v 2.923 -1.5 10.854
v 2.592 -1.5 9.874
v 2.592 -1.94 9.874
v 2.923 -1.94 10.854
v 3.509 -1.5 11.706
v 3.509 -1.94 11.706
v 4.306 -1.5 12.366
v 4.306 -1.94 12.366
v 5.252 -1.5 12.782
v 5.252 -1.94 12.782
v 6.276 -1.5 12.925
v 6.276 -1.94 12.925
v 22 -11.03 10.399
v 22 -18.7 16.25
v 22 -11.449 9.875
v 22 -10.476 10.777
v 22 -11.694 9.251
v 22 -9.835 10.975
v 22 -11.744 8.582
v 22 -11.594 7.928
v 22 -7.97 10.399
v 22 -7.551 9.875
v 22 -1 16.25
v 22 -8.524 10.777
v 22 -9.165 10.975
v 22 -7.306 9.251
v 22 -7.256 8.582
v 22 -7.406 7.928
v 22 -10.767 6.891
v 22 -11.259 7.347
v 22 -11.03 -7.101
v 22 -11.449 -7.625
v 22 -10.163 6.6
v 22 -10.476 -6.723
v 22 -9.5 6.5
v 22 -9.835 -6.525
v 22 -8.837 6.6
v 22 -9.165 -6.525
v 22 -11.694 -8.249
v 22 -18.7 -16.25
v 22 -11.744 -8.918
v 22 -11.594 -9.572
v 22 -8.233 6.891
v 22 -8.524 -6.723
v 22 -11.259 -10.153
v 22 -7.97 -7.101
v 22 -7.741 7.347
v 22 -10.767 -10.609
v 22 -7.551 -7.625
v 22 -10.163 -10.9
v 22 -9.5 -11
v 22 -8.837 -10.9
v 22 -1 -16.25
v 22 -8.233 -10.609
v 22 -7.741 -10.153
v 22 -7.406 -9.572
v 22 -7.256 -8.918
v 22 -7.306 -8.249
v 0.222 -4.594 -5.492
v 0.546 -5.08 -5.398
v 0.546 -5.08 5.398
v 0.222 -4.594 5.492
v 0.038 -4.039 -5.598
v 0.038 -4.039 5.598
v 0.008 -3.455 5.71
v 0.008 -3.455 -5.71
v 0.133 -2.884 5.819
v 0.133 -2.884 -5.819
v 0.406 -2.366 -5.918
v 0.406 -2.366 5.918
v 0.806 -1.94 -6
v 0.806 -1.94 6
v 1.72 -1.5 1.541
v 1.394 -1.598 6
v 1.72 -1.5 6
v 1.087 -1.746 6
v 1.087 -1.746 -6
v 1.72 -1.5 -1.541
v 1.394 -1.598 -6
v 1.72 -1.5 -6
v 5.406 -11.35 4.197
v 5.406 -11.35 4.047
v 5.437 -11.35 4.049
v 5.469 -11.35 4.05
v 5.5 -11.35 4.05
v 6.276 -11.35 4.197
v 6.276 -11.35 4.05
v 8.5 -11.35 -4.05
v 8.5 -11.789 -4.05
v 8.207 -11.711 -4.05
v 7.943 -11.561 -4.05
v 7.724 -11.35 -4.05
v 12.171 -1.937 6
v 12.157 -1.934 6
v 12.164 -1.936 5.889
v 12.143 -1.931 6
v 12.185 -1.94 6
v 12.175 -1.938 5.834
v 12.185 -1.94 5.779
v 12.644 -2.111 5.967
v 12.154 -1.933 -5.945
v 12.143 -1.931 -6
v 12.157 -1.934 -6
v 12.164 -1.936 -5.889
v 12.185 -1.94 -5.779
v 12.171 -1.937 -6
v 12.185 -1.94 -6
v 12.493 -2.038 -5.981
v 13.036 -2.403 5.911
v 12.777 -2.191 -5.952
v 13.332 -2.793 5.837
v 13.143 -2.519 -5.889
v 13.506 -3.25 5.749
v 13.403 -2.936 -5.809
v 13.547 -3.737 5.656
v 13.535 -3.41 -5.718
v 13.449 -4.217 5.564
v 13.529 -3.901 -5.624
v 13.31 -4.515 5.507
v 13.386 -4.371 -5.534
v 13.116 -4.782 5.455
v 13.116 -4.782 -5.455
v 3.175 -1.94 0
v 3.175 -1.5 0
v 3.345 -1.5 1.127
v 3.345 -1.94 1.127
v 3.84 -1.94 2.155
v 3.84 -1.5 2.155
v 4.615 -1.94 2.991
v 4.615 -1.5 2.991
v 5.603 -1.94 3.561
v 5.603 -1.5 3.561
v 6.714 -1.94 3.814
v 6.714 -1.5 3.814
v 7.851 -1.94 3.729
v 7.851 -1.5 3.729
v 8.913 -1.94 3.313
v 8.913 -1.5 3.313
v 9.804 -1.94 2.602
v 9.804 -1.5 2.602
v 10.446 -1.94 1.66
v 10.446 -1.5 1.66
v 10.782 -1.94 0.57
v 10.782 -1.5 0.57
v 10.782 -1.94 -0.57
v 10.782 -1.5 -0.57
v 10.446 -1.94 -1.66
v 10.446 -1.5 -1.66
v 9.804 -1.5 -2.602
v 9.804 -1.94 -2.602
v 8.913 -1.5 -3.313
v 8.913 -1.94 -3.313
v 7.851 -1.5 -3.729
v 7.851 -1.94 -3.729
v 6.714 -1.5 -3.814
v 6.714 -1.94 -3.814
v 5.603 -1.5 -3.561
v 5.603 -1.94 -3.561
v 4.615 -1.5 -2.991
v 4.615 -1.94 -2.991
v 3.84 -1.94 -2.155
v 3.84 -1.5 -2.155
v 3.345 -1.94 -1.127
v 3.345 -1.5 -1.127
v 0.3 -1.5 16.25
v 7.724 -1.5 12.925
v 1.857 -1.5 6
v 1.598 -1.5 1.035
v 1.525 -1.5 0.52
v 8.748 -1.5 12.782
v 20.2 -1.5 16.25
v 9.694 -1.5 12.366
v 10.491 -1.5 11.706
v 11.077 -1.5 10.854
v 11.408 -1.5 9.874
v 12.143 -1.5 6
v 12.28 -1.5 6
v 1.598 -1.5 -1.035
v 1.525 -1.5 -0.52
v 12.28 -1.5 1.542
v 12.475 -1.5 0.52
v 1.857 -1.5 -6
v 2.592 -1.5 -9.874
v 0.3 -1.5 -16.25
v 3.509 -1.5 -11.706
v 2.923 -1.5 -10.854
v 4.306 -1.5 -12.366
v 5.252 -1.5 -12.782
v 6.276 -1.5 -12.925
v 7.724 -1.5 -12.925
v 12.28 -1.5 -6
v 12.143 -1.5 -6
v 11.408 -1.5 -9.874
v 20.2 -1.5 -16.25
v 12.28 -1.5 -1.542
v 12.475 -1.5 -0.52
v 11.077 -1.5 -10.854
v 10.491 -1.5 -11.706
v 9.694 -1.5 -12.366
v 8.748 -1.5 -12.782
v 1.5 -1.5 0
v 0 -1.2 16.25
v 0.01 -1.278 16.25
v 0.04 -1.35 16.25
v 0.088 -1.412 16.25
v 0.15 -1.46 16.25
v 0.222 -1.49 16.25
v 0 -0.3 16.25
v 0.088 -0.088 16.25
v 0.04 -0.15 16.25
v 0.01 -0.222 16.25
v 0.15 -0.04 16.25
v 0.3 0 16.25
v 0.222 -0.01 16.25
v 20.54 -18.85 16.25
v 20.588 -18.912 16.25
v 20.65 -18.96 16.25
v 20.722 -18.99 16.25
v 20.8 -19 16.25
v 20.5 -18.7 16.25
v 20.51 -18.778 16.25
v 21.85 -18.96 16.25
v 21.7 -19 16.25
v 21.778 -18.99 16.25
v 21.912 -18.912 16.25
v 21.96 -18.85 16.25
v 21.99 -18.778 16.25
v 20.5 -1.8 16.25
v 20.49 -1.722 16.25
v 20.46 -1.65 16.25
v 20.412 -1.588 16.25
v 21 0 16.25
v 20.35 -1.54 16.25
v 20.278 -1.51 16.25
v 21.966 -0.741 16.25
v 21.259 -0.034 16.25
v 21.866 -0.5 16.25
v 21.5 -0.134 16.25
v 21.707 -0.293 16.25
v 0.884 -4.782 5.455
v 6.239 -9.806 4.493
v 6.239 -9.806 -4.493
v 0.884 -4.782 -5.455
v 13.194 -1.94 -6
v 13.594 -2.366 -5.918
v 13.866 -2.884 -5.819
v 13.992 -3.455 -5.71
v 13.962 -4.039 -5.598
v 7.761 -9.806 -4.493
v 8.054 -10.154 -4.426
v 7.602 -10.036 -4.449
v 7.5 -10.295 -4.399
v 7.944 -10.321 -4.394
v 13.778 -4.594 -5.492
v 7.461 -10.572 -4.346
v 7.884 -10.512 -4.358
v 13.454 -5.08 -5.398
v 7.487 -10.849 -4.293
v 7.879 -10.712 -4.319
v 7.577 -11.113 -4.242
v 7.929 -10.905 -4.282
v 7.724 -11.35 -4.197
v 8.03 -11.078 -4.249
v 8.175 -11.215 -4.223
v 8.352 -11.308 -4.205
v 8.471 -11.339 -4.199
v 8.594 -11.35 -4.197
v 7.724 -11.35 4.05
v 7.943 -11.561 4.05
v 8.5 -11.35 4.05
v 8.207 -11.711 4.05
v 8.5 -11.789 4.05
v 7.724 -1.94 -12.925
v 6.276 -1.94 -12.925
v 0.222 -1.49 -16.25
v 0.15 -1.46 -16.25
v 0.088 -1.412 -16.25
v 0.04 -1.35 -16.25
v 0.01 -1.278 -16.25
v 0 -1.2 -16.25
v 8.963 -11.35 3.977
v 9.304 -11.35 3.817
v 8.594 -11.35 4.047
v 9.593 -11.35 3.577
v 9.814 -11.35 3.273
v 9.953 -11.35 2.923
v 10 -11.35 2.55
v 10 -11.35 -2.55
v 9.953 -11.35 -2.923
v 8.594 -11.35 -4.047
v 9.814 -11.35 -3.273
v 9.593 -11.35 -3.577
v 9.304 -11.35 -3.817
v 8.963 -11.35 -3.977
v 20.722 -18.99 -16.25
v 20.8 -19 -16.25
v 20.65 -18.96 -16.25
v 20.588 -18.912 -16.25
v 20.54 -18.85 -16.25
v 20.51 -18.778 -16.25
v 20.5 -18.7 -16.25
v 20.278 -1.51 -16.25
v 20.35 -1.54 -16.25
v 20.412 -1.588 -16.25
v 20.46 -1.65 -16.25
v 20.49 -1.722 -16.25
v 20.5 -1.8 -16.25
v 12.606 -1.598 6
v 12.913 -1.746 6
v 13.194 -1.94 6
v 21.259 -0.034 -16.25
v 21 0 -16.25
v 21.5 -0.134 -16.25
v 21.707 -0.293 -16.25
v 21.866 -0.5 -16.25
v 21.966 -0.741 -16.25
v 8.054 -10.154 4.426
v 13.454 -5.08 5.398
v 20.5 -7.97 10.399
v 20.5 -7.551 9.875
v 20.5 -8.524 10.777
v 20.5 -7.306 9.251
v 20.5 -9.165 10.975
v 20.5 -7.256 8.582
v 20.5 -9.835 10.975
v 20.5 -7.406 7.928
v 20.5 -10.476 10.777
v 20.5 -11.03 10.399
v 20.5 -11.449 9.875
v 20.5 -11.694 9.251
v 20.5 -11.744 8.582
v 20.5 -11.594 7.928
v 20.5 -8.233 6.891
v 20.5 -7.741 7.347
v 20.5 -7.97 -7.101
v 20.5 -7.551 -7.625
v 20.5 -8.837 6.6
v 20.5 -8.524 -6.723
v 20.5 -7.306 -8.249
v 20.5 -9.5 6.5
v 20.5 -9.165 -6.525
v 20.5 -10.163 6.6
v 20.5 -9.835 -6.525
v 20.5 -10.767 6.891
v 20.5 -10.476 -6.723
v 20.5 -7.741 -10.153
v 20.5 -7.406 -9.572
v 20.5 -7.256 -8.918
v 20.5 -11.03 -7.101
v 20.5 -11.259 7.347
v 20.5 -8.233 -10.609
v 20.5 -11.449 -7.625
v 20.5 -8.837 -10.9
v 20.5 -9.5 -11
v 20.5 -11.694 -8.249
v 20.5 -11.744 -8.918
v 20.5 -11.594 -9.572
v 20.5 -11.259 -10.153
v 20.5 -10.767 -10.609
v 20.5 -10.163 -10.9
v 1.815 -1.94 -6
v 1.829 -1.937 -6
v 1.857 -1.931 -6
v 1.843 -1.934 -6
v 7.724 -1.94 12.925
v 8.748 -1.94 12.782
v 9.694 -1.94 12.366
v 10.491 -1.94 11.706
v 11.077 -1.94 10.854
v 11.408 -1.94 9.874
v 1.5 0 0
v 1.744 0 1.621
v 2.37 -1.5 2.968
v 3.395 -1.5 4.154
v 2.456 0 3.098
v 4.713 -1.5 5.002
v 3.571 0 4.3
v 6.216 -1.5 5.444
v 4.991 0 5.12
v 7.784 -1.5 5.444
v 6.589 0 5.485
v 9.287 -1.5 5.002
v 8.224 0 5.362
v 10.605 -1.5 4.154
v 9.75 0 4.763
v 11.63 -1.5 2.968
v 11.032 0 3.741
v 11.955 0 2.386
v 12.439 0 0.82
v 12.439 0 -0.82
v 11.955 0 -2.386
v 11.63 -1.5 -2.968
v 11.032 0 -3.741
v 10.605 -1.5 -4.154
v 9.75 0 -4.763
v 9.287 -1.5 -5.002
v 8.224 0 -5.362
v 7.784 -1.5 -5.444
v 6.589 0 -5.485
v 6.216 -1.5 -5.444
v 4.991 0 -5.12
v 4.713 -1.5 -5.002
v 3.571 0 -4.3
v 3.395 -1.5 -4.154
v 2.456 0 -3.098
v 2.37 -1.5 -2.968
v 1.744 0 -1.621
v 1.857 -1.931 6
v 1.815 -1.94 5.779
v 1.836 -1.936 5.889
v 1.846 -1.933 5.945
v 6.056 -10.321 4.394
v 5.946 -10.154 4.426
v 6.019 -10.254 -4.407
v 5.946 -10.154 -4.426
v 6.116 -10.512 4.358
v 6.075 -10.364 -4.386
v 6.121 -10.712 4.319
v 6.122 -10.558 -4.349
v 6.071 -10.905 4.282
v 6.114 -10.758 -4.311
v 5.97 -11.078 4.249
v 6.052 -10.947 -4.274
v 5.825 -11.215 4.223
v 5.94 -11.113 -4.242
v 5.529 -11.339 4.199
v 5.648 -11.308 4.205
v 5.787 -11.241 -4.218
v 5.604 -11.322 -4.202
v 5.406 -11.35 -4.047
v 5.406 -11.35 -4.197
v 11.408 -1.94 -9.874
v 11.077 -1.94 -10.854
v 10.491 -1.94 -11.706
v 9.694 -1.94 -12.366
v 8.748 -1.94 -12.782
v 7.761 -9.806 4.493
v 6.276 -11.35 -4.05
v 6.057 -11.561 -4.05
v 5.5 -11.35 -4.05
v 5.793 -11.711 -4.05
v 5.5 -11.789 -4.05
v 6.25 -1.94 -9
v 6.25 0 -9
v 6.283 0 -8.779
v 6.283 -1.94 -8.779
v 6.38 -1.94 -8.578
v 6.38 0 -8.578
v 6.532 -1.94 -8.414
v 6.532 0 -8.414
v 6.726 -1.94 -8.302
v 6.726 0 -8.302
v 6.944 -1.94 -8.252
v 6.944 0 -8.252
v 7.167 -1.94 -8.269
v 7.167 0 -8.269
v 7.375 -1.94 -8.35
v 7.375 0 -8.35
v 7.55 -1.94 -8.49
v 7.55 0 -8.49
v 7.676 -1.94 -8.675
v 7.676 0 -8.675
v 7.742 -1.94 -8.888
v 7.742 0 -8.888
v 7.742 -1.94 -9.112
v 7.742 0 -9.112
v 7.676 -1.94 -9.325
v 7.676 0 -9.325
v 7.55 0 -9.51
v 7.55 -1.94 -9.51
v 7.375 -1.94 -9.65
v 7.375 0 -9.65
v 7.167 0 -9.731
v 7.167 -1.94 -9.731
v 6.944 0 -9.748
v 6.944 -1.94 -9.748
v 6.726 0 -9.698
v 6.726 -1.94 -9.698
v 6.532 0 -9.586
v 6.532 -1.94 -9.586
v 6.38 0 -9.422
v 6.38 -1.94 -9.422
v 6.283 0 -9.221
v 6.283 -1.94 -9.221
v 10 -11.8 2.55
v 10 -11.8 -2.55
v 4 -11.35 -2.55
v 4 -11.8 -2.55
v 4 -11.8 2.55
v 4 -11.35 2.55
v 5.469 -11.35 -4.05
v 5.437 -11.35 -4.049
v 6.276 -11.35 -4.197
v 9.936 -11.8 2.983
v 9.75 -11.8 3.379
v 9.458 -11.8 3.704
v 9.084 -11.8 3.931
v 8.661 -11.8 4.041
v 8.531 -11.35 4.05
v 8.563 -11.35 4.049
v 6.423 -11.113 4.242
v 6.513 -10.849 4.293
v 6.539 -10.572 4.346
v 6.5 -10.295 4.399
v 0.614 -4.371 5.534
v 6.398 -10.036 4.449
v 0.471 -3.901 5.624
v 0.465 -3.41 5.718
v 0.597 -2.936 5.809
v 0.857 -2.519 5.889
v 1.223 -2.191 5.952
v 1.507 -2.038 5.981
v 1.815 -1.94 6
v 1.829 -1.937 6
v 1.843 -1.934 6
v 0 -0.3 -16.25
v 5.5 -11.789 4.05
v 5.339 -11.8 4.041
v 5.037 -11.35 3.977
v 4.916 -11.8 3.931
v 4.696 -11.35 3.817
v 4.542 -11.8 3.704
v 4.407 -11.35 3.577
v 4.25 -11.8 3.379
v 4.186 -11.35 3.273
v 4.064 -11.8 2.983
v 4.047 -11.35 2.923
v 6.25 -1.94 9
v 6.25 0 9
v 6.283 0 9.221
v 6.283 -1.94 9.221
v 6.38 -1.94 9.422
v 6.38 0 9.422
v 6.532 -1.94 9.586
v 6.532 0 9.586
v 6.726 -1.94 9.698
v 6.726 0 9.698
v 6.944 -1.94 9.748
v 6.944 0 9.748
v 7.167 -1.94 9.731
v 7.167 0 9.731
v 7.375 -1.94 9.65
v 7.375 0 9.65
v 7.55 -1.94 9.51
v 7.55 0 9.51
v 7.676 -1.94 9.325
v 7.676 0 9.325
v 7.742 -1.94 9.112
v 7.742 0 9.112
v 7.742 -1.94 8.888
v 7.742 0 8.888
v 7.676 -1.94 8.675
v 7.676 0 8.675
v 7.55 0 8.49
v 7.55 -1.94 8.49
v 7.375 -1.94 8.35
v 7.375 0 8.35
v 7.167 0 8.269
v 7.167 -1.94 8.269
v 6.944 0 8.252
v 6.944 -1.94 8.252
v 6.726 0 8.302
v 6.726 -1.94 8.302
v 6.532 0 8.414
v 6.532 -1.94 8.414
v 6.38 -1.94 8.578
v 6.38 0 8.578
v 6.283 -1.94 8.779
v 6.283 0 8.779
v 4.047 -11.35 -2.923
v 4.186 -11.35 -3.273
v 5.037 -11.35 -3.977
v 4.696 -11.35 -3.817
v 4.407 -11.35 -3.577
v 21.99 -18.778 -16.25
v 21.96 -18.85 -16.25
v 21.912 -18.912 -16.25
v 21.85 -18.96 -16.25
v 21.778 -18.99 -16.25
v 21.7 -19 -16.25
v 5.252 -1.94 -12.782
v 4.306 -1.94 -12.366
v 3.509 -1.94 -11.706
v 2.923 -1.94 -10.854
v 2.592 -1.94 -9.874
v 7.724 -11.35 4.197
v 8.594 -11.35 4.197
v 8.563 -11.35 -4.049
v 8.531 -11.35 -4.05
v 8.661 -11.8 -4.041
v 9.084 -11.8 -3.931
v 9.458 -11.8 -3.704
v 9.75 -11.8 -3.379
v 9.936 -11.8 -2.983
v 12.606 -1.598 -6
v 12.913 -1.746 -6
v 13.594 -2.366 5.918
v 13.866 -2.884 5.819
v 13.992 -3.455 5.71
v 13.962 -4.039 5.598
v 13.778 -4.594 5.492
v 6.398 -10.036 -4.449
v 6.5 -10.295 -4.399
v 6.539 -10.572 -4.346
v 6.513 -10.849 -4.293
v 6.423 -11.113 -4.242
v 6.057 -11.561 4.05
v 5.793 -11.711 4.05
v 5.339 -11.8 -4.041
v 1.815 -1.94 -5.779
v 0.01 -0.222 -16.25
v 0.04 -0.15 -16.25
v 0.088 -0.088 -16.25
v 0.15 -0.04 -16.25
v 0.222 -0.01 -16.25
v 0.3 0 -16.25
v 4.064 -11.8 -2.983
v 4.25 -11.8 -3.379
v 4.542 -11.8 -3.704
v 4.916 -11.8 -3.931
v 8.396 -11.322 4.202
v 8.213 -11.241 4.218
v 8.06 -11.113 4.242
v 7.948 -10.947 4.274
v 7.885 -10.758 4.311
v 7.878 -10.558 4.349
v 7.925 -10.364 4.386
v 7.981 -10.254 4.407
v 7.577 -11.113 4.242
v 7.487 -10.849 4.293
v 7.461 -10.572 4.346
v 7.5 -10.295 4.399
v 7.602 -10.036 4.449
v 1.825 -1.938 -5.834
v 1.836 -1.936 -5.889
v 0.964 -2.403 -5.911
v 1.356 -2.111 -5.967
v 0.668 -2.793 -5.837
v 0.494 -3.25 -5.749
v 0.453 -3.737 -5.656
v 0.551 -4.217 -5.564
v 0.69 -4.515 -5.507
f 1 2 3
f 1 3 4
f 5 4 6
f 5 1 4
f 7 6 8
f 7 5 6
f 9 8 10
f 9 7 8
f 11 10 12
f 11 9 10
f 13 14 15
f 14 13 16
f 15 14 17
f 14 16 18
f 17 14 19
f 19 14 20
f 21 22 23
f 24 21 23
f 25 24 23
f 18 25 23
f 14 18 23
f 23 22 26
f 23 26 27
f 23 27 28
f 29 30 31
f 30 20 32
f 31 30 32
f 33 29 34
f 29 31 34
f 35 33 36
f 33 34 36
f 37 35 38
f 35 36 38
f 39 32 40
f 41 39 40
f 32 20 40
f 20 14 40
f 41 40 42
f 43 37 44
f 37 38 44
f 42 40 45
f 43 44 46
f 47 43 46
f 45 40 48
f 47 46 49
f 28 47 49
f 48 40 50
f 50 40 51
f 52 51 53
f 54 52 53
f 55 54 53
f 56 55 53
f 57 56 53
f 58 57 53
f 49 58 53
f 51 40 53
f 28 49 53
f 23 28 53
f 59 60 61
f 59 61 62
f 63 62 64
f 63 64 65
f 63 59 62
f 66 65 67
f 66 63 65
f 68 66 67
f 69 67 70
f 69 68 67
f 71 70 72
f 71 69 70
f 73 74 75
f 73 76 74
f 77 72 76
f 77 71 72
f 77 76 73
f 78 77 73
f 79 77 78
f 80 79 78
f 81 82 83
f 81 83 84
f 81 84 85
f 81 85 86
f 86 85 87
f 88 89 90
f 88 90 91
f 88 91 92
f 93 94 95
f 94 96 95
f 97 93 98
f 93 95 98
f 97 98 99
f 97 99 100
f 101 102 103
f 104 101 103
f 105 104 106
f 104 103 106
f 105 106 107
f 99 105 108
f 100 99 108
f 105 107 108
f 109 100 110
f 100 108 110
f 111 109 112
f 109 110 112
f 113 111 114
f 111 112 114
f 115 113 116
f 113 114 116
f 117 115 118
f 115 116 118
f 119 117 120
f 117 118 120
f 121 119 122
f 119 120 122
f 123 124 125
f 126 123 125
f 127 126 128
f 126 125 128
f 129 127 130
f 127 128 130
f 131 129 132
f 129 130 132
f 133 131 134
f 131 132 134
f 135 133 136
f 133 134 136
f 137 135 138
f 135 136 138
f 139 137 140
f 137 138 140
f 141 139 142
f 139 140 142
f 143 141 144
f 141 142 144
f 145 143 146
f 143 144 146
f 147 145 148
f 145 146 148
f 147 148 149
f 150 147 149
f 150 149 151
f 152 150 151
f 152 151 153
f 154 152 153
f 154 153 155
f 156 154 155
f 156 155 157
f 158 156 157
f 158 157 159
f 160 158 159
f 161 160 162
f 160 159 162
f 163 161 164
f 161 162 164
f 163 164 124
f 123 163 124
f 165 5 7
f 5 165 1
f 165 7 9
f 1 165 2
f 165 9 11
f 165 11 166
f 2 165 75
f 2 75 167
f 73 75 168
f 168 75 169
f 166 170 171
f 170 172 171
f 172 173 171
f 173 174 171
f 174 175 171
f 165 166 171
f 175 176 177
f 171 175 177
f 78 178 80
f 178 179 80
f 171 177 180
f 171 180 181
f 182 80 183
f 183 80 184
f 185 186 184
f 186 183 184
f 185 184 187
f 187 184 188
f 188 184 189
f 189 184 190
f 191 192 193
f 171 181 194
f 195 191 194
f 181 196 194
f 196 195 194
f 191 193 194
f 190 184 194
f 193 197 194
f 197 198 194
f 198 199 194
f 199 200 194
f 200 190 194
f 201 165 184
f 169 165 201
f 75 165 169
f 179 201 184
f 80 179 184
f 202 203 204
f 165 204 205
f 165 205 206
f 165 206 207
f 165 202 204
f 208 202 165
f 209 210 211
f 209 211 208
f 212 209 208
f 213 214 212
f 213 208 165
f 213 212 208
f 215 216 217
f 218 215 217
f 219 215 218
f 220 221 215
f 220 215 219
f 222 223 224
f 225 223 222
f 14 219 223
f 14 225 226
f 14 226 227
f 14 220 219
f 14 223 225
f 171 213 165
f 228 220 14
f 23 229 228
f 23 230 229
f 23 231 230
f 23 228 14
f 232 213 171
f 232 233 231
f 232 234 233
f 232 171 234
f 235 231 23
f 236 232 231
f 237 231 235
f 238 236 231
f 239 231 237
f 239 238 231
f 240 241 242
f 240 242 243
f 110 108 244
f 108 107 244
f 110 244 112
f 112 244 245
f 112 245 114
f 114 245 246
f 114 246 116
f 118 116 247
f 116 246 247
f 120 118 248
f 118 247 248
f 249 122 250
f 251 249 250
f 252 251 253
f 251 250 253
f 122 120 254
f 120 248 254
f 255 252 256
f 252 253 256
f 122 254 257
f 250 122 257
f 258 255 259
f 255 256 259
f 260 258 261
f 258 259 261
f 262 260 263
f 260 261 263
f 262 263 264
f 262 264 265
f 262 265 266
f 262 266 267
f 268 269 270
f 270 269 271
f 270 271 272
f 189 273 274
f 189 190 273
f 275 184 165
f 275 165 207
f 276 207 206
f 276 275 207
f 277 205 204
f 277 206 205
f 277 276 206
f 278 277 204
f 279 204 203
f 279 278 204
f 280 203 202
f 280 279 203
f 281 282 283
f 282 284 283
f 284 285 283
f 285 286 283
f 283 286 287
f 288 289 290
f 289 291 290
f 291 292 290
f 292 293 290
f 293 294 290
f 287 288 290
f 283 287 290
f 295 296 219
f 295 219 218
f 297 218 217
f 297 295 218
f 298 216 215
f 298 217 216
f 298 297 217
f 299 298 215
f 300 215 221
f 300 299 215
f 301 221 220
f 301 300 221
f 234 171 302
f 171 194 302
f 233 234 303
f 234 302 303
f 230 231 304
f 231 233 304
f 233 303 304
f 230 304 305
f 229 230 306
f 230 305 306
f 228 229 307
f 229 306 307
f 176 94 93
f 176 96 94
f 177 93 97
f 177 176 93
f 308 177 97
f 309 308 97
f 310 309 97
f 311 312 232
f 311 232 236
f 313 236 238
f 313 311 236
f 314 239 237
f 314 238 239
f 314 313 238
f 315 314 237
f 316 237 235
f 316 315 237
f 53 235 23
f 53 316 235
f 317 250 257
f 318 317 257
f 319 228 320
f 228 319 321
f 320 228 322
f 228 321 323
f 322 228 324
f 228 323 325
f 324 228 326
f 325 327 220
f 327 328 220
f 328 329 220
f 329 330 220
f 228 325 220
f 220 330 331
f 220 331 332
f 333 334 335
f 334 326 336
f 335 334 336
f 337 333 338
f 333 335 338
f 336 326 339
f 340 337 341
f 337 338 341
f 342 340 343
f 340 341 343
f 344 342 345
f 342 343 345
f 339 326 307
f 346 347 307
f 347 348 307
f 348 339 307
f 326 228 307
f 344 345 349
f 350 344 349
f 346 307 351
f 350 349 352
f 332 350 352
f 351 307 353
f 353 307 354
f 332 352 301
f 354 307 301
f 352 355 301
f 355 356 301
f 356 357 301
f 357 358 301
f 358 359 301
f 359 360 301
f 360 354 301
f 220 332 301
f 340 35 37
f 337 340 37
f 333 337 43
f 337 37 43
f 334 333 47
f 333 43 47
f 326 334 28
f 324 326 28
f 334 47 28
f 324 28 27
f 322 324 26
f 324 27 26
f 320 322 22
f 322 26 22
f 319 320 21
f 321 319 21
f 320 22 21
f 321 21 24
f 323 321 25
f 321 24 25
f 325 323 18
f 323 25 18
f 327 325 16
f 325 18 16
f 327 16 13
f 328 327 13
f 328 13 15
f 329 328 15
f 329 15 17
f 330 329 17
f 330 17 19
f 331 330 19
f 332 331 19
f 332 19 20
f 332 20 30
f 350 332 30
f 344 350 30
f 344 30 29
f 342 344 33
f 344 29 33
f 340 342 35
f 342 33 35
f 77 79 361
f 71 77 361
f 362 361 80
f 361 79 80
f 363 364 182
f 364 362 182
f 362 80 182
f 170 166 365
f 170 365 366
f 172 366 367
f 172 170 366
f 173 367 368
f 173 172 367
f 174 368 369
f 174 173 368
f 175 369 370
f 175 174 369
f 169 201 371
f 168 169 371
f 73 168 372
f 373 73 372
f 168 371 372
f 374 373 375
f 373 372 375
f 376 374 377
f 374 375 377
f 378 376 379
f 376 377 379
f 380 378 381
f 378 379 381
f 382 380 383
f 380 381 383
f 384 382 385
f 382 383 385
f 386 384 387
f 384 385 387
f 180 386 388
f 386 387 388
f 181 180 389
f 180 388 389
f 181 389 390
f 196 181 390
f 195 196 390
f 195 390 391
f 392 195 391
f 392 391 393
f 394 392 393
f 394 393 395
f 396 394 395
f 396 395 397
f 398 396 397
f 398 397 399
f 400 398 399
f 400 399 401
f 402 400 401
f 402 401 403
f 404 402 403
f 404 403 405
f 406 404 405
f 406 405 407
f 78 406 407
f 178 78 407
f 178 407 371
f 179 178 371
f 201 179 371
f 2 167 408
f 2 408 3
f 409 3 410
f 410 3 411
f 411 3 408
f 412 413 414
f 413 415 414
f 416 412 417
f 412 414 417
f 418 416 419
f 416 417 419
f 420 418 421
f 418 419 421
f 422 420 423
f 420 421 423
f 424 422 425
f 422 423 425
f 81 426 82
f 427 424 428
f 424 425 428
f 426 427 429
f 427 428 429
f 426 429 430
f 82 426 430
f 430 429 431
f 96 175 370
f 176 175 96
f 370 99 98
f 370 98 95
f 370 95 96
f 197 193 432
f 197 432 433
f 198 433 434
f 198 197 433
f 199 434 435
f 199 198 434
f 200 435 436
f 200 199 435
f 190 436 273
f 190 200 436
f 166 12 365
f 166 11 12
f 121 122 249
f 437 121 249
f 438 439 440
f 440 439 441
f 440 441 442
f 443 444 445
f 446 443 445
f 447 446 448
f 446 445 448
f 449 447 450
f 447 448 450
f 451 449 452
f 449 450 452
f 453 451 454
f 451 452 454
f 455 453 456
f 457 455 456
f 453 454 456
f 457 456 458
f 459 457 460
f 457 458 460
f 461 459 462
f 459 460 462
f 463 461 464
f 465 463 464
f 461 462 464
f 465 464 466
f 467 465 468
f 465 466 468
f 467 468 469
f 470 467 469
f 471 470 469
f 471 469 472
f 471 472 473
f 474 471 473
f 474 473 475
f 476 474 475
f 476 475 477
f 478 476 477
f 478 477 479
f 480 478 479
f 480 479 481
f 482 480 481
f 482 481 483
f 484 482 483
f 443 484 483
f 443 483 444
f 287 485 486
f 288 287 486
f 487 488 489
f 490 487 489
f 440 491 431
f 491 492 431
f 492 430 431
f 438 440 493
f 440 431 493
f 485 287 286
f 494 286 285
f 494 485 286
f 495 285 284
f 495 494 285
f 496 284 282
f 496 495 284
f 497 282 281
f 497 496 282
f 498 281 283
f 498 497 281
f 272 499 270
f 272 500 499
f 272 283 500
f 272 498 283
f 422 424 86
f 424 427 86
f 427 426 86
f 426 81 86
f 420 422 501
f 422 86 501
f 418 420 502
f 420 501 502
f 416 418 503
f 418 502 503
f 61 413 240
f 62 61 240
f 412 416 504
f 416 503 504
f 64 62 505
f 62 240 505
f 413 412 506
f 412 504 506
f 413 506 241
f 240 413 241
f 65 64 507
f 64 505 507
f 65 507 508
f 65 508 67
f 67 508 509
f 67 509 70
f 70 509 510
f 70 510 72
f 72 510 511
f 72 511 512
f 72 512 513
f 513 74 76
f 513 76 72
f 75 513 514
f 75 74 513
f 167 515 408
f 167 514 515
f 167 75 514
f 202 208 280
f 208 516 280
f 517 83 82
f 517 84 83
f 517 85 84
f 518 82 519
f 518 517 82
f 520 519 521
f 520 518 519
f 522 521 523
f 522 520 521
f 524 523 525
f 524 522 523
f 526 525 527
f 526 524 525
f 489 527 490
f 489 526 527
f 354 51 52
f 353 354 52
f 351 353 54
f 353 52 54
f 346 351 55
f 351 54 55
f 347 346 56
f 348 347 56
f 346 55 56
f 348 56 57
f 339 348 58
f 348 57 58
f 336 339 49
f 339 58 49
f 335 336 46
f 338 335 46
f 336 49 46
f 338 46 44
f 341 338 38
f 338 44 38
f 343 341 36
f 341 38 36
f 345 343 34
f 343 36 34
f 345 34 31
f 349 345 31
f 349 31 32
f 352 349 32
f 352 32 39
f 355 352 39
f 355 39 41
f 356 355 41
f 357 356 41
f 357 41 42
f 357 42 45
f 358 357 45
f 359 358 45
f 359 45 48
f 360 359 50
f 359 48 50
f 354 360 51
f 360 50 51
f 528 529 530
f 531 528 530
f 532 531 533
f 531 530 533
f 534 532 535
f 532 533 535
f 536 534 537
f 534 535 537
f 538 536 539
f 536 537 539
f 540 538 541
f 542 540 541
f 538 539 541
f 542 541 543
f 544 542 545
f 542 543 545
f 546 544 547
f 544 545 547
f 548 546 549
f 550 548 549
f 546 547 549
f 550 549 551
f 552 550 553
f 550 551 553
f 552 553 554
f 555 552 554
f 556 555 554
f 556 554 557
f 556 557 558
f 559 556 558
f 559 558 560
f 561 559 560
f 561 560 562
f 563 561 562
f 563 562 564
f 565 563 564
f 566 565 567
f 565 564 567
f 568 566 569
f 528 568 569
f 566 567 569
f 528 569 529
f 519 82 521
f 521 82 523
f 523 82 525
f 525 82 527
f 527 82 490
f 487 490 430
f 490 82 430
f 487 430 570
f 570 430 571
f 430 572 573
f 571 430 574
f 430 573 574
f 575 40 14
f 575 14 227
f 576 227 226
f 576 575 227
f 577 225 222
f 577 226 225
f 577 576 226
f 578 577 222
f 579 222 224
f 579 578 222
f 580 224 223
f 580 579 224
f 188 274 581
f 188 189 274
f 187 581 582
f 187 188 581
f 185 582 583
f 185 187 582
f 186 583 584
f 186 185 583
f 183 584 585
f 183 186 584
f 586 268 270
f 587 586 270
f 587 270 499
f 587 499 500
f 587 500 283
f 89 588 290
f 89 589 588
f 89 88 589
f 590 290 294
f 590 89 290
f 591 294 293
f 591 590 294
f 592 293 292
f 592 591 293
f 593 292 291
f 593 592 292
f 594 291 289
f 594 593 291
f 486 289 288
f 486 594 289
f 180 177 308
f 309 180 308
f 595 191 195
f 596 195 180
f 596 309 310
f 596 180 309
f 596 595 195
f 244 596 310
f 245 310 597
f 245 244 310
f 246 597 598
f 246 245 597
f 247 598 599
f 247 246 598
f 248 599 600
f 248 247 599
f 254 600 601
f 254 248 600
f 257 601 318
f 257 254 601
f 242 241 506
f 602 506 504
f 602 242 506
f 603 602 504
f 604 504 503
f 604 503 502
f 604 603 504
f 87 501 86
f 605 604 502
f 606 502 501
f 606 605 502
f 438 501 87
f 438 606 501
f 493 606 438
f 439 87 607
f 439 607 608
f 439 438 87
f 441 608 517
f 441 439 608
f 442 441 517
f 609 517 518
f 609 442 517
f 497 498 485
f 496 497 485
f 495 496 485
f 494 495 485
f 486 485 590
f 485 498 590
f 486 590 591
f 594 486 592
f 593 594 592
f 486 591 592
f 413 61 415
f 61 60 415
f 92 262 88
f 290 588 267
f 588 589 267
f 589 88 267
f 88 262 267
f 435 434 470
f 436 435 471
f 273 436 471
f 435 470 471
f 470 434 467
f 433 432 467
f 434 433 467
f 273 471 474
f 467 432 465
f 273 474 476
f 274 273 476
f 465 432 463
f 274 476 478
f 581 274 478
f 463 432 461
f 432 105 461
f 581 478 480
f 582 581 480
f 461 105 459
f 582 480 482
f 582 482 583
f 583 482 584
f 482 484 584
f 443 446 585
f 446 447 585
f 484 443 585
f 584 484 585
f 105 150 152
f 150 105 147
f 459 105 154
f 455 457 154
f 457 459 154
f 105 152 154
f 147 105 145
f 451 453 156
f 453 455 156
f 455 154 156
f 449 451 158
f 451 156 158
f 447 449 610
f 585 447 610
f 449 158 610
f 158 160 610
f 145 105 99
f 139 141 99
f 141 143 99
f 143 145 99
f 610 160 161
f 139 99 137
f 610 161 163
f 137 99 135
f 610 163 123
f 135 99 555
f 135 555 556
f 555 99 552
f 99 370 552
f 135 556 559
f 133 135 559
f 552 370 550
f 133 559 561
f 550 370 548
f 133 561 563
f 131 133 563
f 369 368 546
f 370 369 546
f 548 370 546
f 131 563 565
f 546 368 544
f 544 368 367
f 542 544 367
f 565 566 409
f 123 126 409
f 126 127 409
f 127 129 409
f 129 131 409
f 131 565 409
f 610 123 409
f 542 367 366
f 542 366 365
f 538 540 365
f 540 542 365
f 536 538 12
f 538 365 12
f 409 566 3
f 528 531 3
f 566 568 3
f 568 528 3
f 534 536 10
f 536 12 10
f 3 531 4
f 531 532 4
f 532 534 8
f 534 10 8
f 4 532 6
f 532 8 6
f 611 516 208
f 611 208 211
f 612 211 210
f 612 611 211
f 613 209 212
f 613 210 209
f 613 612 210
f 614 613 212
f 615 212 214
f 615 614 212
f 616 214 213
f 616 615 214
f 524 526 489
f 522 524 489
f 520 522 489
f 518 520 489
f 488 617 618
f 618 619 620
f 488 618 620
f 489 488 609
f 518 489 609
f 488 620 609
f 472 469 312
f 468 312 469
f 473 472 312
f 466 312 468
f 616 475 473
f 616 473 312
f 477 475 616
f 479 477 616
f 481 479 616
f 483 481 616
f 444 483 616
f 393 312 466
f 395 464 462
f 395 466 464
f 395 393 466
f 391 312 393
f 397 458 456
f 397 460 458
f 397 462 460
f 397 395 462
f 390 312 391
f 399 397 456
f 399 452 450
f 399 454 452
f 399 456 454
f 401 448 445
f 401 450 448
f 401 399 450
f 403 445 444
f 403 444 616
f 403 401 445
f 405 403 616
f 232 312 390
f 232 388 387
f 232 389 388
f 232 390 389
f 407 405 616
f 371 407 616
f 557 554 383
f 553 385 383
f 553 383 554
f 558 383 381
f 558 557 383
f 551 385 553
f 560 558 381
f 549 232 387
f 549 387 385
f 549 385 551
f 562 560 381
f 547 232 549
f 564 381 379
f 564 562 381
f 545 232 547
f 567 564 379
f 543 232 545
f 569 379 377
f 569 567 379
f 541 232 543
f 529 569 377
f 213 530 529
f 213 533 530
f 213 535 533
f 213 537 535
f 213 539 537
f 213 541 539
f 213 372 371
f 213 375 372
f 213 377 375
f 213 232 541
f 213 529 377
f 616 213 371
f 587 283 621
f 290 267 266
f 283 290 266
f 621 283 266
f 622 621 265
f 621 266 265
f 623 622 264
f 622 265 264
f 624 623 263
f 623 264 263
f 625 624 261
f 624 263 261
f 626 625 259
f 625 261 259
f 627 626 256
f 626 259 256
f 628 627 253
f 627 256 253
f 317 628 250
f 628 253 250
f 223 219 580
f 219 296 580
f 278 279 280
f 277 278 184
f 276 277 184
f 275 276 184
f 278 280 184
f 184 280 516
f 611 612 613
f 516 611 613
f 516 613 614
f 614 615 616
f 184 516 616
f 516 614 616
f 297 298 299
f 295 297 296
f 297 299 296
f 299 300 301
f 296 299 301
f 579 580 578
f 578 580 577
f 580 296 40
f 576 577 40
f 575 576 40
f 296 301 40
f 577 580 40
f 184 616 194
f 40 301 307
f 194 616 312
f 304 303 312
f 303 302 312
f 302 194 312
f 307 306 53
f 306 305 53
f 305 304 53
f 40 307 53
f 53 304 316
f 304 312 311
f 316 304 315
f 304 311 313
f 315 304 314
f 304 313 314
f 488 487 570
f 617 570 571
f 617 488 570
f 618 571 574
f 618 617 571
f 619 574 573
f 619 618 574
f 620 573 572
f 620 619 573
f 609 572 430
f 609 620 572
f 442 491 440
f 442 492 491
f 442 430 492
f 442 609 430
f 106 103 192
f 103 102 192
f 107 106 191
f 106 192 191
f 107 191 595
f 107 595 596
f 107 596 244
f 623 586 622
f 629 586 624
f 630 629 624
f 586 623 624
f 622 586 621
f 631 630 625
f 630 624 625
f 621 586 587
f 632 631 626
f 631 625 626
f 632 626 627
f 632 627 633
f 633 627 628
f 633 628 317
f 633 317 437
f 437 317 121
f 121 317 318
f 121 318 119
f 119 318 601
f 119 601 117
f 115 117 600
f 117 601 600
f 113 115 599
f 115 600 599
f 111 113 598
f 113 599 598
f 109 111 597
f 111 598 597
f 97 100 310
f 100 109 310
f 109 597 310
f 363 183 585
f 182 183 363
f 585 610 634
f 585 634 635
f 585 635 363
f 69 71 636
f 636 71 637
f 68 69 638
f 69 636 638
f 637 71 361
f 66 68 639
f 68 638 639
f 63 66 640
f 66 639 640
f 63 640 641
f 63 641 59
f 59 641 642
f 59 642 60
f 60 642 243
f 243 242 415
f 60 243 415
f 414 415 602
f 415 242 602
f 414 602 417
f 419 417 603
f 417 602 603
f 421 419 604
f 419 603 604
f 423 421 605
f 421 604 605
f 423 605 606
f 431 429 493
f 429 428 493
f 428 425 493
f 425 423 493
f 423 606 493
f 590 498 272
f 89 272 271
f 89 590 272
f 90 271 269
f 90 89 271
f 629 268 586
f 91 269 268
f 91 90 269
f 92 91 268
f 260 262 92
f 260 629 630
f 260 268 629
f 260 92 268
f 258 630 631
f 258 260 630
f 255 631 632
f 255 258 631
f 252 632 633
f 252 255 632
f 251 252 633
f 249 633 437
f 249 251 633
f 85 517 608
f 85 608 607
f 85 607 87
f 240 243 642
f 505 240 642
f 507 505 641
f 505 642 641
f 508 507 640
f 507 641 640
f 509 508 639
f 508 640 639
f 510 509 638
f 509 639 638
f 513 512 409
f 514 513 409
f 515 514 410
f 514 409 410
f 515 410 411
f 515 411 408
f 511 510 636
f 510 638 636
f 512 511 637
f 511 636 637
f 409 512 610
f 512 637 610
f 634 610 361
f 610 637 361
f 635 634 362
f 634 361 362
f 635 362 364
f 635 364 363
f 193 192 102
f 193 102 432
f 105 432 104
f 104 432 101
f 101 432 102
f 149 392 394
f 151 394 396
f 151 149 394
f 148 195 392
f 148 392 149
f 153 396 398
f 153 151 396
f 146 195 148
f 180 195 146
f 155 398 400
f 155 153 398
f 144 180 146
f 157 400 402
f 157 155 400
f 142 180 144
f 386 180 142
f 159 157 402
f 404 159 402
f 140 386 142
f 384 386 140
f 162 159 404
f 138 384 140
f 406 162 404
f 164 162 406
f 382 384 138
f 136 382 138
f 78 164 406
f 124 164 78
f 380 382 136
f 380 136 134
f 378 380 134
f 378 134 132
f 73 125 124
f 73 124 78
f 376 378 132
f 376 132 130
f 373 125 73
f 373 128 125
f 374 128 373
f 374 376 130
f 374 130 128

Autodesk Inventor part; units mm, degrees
sketch "Skizze_1" plane through (0, 0, 0) normal (0, 0, 1) x (1, 0, 0)
  line L0 (0, -0.3) -> (0, -1.2)
  arc A0 (0, -1.2) -> (0.3, -1.5) centre (0.3, -1.2) ccw
  line L1 (0.3, -1.5) -> (20.2, -1.5)
  arc A1 (20.5, -1.8) -> (20.2, -1.5) centre (20.2, -1.8) ccw
  line L2 (20.5, -1.8) -> (20.5, -18.7)
  arc A2 (20.5, -18.7) -> (20.8, -19) centre (20.8, -18.7) ccw
  line L3 (20.8, -19) -> (21.7, -19)
  arc A3 (21.7, -19) -> (22, -18.7) centre (21.7, -18.7) ccw
  line L4 (22, -18.7) -> (22, -1)
  arc A4 (22, -1) -> (21, 0) centre (21, -1) ccw
  line L5 (21, 0) -> (0.3, 0)
  arc A5 (0.3, 0) -> (0, -0.3) centre (0.3, -0.3) ccw
extrude "Extrusion1" add sketch "Skizze_1" along normal mid plane 32.5
sketch "Skizze_2" plane through (22, 0, 0) normal (1, 0, 0) x (0, 0, -1)
  circle A0 centre (8.75, -9.5) radius 2.25
extrude "Extrusion2" cut sketch "Skizze_2" along normal mid plane 3
sketch "Skizze_3" plane through (22, 0, 0) normal (1, 0, 0) x (0, 0, -1)
  circle A0 centre (-8.75, -9.5) radius 2.25
extrude "Extrusion3" cut sketch "Skizze_3" along normal mid plane 3
sketch "Skizze_4" plane through (0, 0, 0) normal (0, 0, 1) x (1, 0, 0)
  arc A0 (2.1852, -1.45) -> (0.5463, -5.08) centre (2.1852, -3.635) ccw
  line L0 (0.5463, -5.08) -> (5.946, -10.1545)
  arc A1 (5.4062, -11.35) -> (5.946, -10.1545) centre (5.4062, -10.6304) ccw
  line L1 (5.4062, -11.35) -> (4, -11.35)
  line L2 (4, -11.35) -> (4, -11.8)
  line L3 (4, -11.8) -> (5.3389, -11.8)
  arc A2 (5.3389, -11.8) -> (6.239, -9.8064) centre (5.3389, -10.6) ccw
  line L4 (6.239, -9.8064) -> (0.8838, -4.7824)
  arc A3 (2.1852, -1.9) -> (0.8838, -4.7824) centre (2.1852, -3.635) ccw
  line L5 (2.1852, -1.9) -> (11.8148, -1.9)
  arc A4 (13.1162, -4.7824) -> (11.8148, -1.9) centre (11.8148, -3.635) ccw
  line L6 (13.1162, -4.7824) -> (7.761, -9.8064)
  arc A5 (7.761, -9.8064) -> (8.6611, -11.8) centre (8.6611, -10.6) ccw
  line L7 (8.6611, -11.8) -> (10, -11.8)
  line L8 (10, -11.8) -> (10, -11.35)
  line L9 (10, -11.35) -> (8.5938, -11.35)
  arc A6 (8.054, -10.1545) -> (8.5938, -11.35) centre (8.5938, -10.6304) ccw
  line L10 (8.054, -10.1545) -> (13.4537, -5.08)
  arc A7 (13.4537, -5.08) -> (11.8148, -1.45) centre (11.8148, -3.635) ccw
  line L11 (11.8148, -1.45) -> (2.1852, -1.45)
extrude "Extrusion4" add sketch "Skizze_4" along normal mid plane 12
sketch "Skizze_5" plane through (0, 0, 0) normal (0, 1, 0) x (-1, 0, 0)
  line L0 (-1.809, 5.7484) -> (-2.5923, 9.8744)
  arc A0 (-2.5923, 9.8744) -> (-6.2765, 12.925) centre (-6.2765, 9.175) ccw
  line L1 (-6.2765, 12.925) -> (-7.7235, 12.925)
  arc A1 (-7.7235, 12.925) -> (-11.4077, 9.8744) centre (-7.7235, 9.175) ccw
  line L2 (-11.4077, 9.8744) -> (-12.191, 5.7484)
  line L3 (-12.191, 5.7484) -> (-12.191, -5.7484)
  line L4 (-12.191, -5.7484) -> (-11.4077, -9.8744)
  arc A2 (-11.4077, -9.8744) -> (-7.7235, -12.925) centre (-7.7235, -9.175) ccw
  line L5 (-7.7235, -12.925) -> (-6.2765, -12.925)
  arc A3 (-6.2765, -12.925) -> (-2.5923, -9.8744) centre (-6.2765, -9.175) ccw
  line L6 (-2.5923, -9.8744) -> (-1.809, -5.7484)
  line L7 (-1.809, -5.7484) -> (-1.809, 5.7484)
extrude "Extrusion5" add sketch "Skizze_5" against normal blind 1.94
sketch "Skizze_6_ALT_Drilling_1" plane through (0, 0, 0) normal (0, 1, 0) x (-1, 0, 0)
  circle A0 centre (-7, 0) radius 5.5
extrude "Extrusion6" cut sketch "Skizze_6_ALT_Drilling_1" against normal blind 1.5
sketch "Skizze_7_ALT_Drilling_2" plane through (0, 0, 0) normal (0, 1, 0) x (-1, 0, 0)
  circle A0 centre (-7, 0) radius 3.825
extrude "Extrusion7" cut sketch "Skizze_7_ALT_Drilling_2" against normal blind 2.6
sketch "Skizze_8" plane through (17, 0, 0) normal (1, 0, 0) x (0, 0, -1)
  line L0 (-6, -1.94) -> (-6, -12.9)
  line L1 (-6, -12.9) -> (-3.9, -12.9)
  line L2 (-3.9, -12.9) -> (-6, -1.94)
extrude "Extrusion8" cut sketch "Skizze_8" against normal blind 30
sketch "Skizze_9" plane through (17, 0, 0) normal (1, 0, 0) x (0, 0, -1)
  line L0 (3.9, -12.9) -> (6, -12.9)
  line L1 (6, -12.9) -> (6, -1.94)
  line L2 (6, -1.94) -> (3.9, -12.9)
extrude "Extrusion9" cut sketch "Skizze_9" against normal blind 30
sketch "Skizze_10_ALT_Drilling_3" plane through (0, 0, 0) normal (0, 1, 0) x (-1, 0, 0)
  circle A0 centre (-7, 9) radius 0.75
extrude "Extrusion10" cut sketch "Skizze_10_ALT_Drilling_3" against normal blind 3
sketch "Skizze_11_ALT_Drilling_4" plane through (0, 0, 0) normal (0, 1, 0) x (-1, 0, 0)
  circle A0 centre (-7, -9) radius 0.75
extrude "Extrusion11" cut sketch "Skizze_11_ALT_Drilling_4" against normal blind 3
sketch "Skizze_12" plane through (0, -11.8, 0) normal (0, 1, 0) x (1, 0, 0)
  line L0 (3, -5.05) -> (11, -5.05)
  line L1 (11, -5.05) -> (11, 5.05)
  line L2 (11, 5.05) -> (3, 5.05)
  line L3 (3, 5.05) -> (3, -5.05)
  arc A0 (4, -2.55) -> (5.5, -4.05) centre (5.5, -2.55) ccw
  line L4 (5.5, -4.05) -> (8.5, -4.05)
  arc A1 (8.5, -4.05) -> (10, -2.55) centre (8.5, -2.55) ccw
  line L5 (10, -2.55) -> (10, 2.55)
  arc A2 (10, 2.55) -> (8.5, 4.05) centre (8.5, 2.55) ccw
  line L6 (8.5, 4.05) -> (5.5, 4.05)
  arc A3 (5.5, 4.05) -> (4, 2.55) centre (5.5, 2.55) ccw
  line L7 (4, 2.55) -> (4, -2.55)
extrude "Extrusion12" cut sketch "Skizze_12" along normal blind 0.45
ref_plane "side_1_XY" through (22, -9.5, 0) normal (1, 0, 0) x (0, 1, 0)
ref_plane "side_1_YZ" through (22, -9.5, 0) normal (0, 1, 0) x (0, 0, 1)
ref_plane "side_1_ZX" through (22, -9.5, 0) normal (0, 0, 1) x (1, 0, 0)
ref_plane "side_2_XY" through (7, -1.6, 0) normal (0, 1, 0) x (1, 0, 0)
ref_plane "side_2_YZ" through (7, -1.6, 0) normal (1, 0, 0) x (0, 0, -1)
ref_plane "side_2_ZX" through (7, -1.6, 0) normal (0, 0, -1) x (0, 1, 0)
properties part number "May Tec 1.64.5101._Mounting angle"
